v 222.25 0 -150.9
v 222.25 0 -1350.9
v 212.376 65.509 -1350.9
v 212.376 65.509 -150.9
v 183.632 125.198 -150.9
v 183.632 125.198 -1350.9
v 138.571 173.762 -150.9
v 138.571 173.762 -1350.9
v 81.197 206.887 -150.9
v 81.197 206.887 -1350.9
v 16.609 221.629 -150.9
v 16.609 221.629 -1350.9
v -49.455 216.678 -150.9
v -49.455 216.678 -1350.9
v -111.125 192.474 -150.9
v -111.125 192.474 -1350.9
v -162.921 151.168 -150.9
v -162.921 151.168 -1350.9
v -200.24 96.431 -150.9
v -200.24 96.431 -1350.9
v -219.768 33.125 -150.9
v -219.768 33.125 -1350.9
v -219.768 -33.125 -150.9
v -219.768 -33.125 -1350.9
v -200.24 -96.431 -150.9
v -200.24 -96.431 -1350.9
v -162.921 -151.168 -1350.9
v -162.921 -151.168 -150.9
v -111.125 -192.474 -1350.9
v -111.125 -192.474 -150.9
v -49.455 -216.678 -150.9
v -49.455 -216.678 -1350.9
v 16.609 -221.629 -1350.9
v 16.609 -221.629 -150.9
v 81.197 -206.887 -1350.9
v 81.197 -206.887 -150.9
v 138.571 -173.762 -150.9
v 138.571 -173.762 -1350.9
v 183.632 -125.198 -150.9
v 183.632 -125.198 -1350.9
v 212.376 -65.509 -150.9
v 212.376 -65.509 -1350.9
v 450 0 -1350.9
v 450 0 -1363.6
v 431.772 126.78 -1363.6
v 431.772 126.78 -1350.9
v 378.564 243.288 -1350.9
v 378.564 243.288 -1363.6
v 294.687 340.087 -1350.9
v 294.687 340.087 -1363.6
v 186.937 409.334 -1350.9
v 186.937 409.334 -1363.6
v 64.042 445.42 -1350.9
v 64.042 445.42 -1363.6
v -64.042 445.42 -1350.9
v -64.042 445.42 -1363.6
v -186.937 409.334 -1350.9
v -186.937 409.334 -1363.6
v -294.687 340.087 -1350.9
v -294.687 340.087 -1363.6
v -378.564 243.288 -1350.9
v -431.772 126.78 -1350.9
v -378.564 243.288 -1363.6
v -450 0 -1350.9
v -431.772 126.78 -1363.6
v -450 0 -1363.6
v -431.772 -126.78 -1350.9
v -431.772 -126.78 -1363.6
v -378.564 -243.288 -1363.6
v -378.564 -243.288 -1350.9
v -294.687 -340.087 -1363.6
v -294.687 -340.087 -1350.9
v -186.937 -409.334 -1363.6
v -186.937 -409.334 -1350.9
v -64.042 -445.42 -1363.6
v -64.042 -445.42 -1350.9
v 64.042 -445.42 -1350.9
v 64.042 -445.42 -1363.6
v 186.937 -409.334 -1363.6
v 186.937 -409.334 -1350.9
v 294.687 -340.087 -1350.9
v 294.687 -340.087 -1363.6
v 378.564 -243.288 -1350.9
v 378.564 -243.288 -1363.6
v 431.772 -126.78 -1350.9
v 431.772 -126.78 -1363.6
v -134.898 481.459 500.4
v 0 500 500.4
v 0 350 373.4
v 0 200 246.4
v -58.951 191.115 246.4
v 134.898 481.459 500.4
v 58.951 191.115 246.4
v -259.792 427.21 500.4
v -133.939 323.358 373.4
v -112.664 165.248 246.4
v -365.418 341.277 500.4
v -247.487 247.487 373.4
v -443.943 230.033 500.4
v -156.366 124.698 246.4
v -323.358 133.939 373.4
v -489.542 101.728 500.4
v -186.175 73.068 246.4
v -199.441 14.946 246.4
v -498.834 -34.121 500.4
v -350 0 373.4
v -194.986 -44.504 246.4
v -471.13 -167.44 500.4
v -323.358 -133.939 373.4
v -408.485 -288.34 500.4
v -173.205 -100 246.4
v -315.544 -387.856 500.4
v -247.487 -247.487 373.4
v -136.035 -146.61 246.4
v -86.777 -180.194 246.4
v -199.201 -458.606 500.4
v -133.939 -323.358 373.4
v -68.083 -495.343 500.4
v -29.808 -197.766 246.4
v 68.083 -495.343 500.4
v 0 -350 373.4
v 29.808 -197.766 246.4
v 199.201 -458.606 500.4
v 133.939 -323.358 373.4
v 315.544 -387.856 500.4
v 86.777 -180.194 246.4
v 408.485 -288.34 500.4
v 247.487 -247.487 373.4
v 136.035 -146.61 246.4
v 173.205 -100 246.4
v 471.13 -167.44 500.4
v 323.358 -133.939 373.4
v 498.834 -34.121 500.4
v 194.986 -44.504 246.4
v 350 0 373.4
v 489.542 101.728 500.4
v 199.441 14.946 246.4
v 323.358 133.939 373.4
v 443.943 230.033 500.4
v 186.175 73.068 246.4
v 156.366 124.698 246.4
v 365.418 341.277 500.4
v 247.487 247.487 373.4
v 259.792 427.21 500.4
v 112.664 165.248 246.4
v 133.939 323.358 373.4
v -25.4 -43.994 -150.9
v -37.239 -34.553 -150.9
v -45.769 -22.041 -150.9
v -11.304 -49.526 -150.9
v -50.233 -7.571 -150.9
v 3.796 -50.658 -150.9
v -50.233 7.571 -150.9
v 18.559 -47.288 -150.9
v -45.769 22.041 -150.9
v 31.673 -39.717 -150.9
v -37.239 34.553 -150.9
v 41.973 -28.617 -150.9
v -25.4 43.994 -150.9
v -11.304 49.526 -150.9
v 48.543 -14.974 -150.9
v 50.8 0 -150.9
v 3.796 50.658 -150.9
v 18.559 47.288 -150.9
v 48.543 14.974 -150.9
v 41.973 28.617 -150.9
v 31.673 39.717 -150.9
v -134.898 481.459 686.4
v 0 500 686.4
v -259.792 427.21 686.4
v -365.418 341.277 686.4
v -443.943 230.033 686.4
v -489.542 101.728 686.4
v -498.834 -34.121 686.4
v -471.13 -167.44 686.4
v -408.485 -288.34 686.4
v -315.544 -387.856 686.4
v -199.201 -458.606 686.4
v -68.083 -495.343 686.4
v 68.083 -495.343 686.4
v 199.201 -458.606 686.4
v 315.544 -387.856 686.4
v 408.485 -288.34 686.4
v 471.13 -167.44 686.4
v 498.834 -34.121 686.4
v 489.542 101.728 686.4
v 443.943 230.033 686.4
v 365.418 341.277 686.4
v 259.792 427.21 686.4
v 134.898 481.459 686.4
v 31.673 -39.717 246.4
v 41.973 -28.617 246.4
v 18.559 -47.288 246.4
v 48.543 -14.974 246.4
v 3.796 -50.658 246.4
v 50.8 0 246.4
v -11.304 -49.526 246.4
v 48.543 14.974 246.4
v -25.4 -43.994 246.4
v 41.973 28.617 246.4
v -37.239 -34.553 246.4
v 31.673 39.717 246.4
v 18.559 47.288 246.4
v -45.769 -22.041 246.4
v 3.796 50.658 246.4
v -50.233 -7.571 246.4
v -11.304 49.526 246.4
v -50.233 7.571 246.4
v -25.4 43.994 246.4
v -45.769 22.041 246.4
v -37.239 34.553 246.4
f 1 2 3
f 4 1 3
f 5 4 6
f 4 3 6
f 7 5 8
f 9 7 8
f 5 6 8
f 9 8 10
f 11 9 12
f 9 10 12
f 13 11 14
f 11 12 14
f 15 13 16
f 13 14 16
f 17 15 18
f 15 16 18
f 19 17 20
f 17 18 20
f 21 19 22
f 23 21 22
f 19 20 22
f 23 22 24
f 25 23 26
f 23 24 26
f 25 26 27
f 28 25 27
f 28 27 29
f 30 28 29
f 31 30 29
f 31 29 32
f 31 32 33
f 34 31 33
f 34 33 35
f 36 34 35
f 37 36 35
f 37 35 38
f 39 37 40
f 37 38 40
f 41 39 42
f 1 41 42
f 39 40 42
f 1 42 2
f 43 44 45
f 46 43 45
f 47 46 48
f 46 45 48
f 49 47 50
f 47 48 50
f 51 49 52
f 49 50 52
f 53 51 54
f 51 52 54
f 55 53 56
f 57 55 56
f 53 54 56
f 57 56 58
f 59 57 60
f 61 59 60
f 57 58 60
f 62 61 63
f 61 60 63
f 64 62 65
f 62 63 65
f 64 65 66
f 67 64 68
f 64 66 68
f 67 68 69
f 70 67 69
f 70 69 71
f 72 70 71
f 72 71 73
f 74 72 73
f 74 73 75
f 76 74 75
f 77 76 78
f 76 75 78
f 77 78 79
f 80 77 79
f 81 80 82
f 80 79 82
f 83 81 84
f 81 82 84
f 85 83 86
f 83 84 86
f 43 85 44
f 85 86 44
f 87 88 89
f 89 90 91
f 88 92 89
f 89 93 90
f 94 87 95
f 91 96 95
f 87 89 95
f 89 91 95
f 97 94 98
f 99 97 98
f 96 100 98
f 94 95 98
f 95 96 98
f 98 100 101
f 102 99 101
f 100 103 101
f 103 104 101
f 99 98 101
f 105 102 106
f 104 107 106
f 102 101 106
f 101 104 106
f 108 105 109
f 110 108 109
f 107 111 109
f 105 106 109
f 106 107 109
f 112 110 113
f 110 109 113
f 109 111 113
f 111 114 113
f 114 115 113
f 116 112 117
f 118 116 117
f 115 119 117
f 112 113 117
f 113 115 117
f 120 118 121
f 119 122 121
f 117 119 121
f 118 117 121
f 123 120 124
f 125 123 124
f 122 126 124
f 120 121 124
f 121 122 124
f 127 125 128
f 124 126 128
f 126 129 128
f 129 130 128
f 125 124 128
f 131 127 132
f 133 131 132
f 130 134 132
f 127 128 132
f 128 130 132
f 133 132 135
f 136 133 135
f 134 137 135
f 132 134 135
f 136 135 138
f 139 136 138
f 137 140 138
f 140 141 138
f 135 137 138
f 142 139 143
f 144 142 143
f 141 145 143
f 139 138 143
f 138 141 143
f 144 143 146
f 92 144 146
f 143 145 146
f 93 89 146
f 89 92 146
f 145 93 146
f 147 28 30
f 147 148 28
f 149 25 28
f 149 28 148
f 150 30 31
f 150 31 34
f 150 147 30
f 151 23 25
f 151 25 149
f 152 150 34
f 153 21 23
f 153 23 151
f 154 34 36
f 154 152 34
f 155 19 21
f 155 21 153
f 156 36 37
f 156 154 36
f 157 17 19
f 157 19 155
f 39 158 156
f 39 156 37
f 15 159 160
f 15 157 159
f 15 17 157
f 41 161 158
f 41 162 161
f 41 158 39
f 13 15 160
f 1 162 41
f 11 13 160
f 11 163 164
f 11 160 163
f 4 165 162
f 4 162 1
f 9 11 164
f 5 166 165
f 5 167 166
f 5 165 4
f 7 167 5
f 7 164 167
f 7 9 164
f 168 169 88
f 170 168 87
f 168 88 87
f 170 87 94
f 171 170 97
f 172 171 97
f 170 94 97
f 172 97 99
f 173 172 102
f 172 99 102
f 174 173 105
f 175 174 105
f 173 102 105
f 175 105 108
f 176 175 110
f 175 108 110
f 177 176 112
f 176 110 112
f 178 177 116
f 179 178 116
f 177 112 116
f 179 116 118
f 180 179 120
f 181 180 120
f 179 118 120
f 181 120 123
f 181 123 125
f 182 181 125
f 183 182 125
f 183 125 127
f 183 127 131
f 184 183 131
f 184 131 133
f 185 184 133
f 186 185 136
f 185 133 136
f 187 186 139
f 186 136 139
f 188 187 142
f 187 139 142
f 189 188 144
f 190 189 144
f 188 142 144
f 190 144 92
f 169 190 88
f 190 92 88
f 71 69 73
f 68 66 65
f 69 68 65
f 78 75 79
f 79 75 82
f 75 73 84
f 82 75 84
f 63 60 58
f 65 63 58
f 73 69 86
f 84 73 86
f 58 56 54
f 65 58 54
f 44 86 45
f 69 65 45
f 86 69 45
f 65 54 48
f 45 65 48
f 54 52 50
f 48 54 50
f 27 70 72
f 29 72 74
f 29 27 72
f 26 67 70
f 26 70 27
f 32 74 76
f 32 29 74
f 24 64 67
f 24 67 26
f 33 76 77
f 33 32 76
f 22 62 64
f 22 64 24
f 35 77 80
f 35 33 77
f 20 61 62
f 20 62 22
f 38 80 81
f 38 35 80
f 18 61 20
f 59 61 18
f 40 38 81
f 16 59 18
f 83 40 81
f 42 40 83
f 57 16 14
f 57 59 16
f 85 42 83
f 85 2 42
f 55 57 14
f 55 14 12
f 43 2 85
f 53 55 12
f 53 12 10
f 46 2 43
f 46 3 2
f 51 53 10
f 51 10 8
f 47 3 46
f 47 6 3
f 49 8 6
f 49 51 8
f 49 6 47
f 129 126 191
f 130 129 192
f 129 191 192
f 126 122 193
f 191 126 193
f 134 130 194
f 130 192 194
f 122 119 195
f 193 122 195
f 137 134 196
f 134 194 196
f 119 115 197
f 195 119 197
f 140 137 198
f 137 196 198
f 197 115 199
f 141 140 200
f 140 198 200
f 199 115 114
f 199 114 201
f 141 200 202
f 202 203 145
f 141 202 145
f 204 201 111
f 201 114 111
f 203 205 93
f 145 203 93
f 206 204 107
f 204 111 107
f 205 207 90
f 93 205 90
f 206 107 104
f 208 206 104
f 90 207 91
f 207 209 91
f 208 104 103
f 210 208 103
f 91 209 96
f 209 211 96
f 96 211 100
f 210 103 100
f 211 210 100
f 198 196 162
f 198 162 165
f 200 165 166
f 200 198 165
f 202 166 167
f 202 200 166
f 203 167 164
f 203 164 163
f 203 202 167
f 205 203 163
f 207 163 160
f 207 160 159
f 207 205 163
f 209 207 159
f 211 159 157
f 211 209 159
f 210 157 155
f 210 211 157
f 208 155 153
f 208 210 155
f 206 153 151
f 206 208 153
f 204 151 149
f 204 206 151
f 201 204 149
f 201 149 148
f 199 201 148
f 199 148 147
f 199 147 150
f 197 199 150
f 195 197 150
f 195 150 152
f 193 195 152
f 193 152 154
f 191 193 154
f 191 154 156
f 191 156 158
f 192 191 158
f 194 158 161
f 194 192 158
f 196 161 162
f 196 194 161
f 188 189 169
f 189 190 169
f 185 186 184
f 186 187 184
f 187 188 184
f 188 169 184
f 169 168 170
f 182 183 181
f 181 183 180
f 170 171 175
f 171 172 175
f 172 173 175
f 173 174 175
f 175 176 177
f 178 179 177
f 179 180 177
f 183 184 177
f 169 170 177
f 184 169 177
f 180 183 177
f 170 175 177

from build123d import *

# Parameters (mm, degrees)
SKETCH1_R                = 50.8
BOSS_EXTRUDE1_DEPTH      = 686.4
BOSS_EXTRUDE1_DEPTH_BACK = 1363.6
SKETCH2_R                = 450
BOSS_EXTRUDE2_DEPTH      = 12.7
SKETCH3_R                = 222.25
BOSS_EXTRUDE3_DEPTH      = 1200


with BuildPart() as part:
    # Sketch1 → Boss-Extrude1 (new body, two sides)
    with BuildSketch(Plane.XY) as boss_extrude1_sk:
        Circle(SKETCH1_R)
    extrude(amount=BOSS_EXTRUDE1_DEPTH)
    extrude(boss_extrude1_sk.sketch, amount=-BOSS_EXTRUDE1_DEPTH_BACK)

    # Sketch2 → Boss-Extrude2 (add)
    with BuildSketch(Plane.XY.offset(-1363.6)):
        Circle(SKETCH2_R)
    extrude(amount=BOSS_EXTRUDE2_DEPTH)

    # Sketch3 → Boss-Extrude3 (add)
    with BuildSketch(Plane.XY.offset(-1350.9)):
        Circle(SKETCH3_R)
    extrude(amount=BOSS_EXTRUDE3_DEPTH)

    # Sketch5 → Revolve1 (revolve)
    with BuildSketch(Plane(origin=(0, 0, 0), x_dir=(0, 0, -1), z_dir=(1, 0, 0))):
        Polygon((-686.4, 0), (-686.4, 500), (-500.4, 500), (-246.4, 200), (-246.4, 0), align=None)
    revolve(axis=Axis((0, 0, 246.4), (0, 0, 1)))


solid = part.part
